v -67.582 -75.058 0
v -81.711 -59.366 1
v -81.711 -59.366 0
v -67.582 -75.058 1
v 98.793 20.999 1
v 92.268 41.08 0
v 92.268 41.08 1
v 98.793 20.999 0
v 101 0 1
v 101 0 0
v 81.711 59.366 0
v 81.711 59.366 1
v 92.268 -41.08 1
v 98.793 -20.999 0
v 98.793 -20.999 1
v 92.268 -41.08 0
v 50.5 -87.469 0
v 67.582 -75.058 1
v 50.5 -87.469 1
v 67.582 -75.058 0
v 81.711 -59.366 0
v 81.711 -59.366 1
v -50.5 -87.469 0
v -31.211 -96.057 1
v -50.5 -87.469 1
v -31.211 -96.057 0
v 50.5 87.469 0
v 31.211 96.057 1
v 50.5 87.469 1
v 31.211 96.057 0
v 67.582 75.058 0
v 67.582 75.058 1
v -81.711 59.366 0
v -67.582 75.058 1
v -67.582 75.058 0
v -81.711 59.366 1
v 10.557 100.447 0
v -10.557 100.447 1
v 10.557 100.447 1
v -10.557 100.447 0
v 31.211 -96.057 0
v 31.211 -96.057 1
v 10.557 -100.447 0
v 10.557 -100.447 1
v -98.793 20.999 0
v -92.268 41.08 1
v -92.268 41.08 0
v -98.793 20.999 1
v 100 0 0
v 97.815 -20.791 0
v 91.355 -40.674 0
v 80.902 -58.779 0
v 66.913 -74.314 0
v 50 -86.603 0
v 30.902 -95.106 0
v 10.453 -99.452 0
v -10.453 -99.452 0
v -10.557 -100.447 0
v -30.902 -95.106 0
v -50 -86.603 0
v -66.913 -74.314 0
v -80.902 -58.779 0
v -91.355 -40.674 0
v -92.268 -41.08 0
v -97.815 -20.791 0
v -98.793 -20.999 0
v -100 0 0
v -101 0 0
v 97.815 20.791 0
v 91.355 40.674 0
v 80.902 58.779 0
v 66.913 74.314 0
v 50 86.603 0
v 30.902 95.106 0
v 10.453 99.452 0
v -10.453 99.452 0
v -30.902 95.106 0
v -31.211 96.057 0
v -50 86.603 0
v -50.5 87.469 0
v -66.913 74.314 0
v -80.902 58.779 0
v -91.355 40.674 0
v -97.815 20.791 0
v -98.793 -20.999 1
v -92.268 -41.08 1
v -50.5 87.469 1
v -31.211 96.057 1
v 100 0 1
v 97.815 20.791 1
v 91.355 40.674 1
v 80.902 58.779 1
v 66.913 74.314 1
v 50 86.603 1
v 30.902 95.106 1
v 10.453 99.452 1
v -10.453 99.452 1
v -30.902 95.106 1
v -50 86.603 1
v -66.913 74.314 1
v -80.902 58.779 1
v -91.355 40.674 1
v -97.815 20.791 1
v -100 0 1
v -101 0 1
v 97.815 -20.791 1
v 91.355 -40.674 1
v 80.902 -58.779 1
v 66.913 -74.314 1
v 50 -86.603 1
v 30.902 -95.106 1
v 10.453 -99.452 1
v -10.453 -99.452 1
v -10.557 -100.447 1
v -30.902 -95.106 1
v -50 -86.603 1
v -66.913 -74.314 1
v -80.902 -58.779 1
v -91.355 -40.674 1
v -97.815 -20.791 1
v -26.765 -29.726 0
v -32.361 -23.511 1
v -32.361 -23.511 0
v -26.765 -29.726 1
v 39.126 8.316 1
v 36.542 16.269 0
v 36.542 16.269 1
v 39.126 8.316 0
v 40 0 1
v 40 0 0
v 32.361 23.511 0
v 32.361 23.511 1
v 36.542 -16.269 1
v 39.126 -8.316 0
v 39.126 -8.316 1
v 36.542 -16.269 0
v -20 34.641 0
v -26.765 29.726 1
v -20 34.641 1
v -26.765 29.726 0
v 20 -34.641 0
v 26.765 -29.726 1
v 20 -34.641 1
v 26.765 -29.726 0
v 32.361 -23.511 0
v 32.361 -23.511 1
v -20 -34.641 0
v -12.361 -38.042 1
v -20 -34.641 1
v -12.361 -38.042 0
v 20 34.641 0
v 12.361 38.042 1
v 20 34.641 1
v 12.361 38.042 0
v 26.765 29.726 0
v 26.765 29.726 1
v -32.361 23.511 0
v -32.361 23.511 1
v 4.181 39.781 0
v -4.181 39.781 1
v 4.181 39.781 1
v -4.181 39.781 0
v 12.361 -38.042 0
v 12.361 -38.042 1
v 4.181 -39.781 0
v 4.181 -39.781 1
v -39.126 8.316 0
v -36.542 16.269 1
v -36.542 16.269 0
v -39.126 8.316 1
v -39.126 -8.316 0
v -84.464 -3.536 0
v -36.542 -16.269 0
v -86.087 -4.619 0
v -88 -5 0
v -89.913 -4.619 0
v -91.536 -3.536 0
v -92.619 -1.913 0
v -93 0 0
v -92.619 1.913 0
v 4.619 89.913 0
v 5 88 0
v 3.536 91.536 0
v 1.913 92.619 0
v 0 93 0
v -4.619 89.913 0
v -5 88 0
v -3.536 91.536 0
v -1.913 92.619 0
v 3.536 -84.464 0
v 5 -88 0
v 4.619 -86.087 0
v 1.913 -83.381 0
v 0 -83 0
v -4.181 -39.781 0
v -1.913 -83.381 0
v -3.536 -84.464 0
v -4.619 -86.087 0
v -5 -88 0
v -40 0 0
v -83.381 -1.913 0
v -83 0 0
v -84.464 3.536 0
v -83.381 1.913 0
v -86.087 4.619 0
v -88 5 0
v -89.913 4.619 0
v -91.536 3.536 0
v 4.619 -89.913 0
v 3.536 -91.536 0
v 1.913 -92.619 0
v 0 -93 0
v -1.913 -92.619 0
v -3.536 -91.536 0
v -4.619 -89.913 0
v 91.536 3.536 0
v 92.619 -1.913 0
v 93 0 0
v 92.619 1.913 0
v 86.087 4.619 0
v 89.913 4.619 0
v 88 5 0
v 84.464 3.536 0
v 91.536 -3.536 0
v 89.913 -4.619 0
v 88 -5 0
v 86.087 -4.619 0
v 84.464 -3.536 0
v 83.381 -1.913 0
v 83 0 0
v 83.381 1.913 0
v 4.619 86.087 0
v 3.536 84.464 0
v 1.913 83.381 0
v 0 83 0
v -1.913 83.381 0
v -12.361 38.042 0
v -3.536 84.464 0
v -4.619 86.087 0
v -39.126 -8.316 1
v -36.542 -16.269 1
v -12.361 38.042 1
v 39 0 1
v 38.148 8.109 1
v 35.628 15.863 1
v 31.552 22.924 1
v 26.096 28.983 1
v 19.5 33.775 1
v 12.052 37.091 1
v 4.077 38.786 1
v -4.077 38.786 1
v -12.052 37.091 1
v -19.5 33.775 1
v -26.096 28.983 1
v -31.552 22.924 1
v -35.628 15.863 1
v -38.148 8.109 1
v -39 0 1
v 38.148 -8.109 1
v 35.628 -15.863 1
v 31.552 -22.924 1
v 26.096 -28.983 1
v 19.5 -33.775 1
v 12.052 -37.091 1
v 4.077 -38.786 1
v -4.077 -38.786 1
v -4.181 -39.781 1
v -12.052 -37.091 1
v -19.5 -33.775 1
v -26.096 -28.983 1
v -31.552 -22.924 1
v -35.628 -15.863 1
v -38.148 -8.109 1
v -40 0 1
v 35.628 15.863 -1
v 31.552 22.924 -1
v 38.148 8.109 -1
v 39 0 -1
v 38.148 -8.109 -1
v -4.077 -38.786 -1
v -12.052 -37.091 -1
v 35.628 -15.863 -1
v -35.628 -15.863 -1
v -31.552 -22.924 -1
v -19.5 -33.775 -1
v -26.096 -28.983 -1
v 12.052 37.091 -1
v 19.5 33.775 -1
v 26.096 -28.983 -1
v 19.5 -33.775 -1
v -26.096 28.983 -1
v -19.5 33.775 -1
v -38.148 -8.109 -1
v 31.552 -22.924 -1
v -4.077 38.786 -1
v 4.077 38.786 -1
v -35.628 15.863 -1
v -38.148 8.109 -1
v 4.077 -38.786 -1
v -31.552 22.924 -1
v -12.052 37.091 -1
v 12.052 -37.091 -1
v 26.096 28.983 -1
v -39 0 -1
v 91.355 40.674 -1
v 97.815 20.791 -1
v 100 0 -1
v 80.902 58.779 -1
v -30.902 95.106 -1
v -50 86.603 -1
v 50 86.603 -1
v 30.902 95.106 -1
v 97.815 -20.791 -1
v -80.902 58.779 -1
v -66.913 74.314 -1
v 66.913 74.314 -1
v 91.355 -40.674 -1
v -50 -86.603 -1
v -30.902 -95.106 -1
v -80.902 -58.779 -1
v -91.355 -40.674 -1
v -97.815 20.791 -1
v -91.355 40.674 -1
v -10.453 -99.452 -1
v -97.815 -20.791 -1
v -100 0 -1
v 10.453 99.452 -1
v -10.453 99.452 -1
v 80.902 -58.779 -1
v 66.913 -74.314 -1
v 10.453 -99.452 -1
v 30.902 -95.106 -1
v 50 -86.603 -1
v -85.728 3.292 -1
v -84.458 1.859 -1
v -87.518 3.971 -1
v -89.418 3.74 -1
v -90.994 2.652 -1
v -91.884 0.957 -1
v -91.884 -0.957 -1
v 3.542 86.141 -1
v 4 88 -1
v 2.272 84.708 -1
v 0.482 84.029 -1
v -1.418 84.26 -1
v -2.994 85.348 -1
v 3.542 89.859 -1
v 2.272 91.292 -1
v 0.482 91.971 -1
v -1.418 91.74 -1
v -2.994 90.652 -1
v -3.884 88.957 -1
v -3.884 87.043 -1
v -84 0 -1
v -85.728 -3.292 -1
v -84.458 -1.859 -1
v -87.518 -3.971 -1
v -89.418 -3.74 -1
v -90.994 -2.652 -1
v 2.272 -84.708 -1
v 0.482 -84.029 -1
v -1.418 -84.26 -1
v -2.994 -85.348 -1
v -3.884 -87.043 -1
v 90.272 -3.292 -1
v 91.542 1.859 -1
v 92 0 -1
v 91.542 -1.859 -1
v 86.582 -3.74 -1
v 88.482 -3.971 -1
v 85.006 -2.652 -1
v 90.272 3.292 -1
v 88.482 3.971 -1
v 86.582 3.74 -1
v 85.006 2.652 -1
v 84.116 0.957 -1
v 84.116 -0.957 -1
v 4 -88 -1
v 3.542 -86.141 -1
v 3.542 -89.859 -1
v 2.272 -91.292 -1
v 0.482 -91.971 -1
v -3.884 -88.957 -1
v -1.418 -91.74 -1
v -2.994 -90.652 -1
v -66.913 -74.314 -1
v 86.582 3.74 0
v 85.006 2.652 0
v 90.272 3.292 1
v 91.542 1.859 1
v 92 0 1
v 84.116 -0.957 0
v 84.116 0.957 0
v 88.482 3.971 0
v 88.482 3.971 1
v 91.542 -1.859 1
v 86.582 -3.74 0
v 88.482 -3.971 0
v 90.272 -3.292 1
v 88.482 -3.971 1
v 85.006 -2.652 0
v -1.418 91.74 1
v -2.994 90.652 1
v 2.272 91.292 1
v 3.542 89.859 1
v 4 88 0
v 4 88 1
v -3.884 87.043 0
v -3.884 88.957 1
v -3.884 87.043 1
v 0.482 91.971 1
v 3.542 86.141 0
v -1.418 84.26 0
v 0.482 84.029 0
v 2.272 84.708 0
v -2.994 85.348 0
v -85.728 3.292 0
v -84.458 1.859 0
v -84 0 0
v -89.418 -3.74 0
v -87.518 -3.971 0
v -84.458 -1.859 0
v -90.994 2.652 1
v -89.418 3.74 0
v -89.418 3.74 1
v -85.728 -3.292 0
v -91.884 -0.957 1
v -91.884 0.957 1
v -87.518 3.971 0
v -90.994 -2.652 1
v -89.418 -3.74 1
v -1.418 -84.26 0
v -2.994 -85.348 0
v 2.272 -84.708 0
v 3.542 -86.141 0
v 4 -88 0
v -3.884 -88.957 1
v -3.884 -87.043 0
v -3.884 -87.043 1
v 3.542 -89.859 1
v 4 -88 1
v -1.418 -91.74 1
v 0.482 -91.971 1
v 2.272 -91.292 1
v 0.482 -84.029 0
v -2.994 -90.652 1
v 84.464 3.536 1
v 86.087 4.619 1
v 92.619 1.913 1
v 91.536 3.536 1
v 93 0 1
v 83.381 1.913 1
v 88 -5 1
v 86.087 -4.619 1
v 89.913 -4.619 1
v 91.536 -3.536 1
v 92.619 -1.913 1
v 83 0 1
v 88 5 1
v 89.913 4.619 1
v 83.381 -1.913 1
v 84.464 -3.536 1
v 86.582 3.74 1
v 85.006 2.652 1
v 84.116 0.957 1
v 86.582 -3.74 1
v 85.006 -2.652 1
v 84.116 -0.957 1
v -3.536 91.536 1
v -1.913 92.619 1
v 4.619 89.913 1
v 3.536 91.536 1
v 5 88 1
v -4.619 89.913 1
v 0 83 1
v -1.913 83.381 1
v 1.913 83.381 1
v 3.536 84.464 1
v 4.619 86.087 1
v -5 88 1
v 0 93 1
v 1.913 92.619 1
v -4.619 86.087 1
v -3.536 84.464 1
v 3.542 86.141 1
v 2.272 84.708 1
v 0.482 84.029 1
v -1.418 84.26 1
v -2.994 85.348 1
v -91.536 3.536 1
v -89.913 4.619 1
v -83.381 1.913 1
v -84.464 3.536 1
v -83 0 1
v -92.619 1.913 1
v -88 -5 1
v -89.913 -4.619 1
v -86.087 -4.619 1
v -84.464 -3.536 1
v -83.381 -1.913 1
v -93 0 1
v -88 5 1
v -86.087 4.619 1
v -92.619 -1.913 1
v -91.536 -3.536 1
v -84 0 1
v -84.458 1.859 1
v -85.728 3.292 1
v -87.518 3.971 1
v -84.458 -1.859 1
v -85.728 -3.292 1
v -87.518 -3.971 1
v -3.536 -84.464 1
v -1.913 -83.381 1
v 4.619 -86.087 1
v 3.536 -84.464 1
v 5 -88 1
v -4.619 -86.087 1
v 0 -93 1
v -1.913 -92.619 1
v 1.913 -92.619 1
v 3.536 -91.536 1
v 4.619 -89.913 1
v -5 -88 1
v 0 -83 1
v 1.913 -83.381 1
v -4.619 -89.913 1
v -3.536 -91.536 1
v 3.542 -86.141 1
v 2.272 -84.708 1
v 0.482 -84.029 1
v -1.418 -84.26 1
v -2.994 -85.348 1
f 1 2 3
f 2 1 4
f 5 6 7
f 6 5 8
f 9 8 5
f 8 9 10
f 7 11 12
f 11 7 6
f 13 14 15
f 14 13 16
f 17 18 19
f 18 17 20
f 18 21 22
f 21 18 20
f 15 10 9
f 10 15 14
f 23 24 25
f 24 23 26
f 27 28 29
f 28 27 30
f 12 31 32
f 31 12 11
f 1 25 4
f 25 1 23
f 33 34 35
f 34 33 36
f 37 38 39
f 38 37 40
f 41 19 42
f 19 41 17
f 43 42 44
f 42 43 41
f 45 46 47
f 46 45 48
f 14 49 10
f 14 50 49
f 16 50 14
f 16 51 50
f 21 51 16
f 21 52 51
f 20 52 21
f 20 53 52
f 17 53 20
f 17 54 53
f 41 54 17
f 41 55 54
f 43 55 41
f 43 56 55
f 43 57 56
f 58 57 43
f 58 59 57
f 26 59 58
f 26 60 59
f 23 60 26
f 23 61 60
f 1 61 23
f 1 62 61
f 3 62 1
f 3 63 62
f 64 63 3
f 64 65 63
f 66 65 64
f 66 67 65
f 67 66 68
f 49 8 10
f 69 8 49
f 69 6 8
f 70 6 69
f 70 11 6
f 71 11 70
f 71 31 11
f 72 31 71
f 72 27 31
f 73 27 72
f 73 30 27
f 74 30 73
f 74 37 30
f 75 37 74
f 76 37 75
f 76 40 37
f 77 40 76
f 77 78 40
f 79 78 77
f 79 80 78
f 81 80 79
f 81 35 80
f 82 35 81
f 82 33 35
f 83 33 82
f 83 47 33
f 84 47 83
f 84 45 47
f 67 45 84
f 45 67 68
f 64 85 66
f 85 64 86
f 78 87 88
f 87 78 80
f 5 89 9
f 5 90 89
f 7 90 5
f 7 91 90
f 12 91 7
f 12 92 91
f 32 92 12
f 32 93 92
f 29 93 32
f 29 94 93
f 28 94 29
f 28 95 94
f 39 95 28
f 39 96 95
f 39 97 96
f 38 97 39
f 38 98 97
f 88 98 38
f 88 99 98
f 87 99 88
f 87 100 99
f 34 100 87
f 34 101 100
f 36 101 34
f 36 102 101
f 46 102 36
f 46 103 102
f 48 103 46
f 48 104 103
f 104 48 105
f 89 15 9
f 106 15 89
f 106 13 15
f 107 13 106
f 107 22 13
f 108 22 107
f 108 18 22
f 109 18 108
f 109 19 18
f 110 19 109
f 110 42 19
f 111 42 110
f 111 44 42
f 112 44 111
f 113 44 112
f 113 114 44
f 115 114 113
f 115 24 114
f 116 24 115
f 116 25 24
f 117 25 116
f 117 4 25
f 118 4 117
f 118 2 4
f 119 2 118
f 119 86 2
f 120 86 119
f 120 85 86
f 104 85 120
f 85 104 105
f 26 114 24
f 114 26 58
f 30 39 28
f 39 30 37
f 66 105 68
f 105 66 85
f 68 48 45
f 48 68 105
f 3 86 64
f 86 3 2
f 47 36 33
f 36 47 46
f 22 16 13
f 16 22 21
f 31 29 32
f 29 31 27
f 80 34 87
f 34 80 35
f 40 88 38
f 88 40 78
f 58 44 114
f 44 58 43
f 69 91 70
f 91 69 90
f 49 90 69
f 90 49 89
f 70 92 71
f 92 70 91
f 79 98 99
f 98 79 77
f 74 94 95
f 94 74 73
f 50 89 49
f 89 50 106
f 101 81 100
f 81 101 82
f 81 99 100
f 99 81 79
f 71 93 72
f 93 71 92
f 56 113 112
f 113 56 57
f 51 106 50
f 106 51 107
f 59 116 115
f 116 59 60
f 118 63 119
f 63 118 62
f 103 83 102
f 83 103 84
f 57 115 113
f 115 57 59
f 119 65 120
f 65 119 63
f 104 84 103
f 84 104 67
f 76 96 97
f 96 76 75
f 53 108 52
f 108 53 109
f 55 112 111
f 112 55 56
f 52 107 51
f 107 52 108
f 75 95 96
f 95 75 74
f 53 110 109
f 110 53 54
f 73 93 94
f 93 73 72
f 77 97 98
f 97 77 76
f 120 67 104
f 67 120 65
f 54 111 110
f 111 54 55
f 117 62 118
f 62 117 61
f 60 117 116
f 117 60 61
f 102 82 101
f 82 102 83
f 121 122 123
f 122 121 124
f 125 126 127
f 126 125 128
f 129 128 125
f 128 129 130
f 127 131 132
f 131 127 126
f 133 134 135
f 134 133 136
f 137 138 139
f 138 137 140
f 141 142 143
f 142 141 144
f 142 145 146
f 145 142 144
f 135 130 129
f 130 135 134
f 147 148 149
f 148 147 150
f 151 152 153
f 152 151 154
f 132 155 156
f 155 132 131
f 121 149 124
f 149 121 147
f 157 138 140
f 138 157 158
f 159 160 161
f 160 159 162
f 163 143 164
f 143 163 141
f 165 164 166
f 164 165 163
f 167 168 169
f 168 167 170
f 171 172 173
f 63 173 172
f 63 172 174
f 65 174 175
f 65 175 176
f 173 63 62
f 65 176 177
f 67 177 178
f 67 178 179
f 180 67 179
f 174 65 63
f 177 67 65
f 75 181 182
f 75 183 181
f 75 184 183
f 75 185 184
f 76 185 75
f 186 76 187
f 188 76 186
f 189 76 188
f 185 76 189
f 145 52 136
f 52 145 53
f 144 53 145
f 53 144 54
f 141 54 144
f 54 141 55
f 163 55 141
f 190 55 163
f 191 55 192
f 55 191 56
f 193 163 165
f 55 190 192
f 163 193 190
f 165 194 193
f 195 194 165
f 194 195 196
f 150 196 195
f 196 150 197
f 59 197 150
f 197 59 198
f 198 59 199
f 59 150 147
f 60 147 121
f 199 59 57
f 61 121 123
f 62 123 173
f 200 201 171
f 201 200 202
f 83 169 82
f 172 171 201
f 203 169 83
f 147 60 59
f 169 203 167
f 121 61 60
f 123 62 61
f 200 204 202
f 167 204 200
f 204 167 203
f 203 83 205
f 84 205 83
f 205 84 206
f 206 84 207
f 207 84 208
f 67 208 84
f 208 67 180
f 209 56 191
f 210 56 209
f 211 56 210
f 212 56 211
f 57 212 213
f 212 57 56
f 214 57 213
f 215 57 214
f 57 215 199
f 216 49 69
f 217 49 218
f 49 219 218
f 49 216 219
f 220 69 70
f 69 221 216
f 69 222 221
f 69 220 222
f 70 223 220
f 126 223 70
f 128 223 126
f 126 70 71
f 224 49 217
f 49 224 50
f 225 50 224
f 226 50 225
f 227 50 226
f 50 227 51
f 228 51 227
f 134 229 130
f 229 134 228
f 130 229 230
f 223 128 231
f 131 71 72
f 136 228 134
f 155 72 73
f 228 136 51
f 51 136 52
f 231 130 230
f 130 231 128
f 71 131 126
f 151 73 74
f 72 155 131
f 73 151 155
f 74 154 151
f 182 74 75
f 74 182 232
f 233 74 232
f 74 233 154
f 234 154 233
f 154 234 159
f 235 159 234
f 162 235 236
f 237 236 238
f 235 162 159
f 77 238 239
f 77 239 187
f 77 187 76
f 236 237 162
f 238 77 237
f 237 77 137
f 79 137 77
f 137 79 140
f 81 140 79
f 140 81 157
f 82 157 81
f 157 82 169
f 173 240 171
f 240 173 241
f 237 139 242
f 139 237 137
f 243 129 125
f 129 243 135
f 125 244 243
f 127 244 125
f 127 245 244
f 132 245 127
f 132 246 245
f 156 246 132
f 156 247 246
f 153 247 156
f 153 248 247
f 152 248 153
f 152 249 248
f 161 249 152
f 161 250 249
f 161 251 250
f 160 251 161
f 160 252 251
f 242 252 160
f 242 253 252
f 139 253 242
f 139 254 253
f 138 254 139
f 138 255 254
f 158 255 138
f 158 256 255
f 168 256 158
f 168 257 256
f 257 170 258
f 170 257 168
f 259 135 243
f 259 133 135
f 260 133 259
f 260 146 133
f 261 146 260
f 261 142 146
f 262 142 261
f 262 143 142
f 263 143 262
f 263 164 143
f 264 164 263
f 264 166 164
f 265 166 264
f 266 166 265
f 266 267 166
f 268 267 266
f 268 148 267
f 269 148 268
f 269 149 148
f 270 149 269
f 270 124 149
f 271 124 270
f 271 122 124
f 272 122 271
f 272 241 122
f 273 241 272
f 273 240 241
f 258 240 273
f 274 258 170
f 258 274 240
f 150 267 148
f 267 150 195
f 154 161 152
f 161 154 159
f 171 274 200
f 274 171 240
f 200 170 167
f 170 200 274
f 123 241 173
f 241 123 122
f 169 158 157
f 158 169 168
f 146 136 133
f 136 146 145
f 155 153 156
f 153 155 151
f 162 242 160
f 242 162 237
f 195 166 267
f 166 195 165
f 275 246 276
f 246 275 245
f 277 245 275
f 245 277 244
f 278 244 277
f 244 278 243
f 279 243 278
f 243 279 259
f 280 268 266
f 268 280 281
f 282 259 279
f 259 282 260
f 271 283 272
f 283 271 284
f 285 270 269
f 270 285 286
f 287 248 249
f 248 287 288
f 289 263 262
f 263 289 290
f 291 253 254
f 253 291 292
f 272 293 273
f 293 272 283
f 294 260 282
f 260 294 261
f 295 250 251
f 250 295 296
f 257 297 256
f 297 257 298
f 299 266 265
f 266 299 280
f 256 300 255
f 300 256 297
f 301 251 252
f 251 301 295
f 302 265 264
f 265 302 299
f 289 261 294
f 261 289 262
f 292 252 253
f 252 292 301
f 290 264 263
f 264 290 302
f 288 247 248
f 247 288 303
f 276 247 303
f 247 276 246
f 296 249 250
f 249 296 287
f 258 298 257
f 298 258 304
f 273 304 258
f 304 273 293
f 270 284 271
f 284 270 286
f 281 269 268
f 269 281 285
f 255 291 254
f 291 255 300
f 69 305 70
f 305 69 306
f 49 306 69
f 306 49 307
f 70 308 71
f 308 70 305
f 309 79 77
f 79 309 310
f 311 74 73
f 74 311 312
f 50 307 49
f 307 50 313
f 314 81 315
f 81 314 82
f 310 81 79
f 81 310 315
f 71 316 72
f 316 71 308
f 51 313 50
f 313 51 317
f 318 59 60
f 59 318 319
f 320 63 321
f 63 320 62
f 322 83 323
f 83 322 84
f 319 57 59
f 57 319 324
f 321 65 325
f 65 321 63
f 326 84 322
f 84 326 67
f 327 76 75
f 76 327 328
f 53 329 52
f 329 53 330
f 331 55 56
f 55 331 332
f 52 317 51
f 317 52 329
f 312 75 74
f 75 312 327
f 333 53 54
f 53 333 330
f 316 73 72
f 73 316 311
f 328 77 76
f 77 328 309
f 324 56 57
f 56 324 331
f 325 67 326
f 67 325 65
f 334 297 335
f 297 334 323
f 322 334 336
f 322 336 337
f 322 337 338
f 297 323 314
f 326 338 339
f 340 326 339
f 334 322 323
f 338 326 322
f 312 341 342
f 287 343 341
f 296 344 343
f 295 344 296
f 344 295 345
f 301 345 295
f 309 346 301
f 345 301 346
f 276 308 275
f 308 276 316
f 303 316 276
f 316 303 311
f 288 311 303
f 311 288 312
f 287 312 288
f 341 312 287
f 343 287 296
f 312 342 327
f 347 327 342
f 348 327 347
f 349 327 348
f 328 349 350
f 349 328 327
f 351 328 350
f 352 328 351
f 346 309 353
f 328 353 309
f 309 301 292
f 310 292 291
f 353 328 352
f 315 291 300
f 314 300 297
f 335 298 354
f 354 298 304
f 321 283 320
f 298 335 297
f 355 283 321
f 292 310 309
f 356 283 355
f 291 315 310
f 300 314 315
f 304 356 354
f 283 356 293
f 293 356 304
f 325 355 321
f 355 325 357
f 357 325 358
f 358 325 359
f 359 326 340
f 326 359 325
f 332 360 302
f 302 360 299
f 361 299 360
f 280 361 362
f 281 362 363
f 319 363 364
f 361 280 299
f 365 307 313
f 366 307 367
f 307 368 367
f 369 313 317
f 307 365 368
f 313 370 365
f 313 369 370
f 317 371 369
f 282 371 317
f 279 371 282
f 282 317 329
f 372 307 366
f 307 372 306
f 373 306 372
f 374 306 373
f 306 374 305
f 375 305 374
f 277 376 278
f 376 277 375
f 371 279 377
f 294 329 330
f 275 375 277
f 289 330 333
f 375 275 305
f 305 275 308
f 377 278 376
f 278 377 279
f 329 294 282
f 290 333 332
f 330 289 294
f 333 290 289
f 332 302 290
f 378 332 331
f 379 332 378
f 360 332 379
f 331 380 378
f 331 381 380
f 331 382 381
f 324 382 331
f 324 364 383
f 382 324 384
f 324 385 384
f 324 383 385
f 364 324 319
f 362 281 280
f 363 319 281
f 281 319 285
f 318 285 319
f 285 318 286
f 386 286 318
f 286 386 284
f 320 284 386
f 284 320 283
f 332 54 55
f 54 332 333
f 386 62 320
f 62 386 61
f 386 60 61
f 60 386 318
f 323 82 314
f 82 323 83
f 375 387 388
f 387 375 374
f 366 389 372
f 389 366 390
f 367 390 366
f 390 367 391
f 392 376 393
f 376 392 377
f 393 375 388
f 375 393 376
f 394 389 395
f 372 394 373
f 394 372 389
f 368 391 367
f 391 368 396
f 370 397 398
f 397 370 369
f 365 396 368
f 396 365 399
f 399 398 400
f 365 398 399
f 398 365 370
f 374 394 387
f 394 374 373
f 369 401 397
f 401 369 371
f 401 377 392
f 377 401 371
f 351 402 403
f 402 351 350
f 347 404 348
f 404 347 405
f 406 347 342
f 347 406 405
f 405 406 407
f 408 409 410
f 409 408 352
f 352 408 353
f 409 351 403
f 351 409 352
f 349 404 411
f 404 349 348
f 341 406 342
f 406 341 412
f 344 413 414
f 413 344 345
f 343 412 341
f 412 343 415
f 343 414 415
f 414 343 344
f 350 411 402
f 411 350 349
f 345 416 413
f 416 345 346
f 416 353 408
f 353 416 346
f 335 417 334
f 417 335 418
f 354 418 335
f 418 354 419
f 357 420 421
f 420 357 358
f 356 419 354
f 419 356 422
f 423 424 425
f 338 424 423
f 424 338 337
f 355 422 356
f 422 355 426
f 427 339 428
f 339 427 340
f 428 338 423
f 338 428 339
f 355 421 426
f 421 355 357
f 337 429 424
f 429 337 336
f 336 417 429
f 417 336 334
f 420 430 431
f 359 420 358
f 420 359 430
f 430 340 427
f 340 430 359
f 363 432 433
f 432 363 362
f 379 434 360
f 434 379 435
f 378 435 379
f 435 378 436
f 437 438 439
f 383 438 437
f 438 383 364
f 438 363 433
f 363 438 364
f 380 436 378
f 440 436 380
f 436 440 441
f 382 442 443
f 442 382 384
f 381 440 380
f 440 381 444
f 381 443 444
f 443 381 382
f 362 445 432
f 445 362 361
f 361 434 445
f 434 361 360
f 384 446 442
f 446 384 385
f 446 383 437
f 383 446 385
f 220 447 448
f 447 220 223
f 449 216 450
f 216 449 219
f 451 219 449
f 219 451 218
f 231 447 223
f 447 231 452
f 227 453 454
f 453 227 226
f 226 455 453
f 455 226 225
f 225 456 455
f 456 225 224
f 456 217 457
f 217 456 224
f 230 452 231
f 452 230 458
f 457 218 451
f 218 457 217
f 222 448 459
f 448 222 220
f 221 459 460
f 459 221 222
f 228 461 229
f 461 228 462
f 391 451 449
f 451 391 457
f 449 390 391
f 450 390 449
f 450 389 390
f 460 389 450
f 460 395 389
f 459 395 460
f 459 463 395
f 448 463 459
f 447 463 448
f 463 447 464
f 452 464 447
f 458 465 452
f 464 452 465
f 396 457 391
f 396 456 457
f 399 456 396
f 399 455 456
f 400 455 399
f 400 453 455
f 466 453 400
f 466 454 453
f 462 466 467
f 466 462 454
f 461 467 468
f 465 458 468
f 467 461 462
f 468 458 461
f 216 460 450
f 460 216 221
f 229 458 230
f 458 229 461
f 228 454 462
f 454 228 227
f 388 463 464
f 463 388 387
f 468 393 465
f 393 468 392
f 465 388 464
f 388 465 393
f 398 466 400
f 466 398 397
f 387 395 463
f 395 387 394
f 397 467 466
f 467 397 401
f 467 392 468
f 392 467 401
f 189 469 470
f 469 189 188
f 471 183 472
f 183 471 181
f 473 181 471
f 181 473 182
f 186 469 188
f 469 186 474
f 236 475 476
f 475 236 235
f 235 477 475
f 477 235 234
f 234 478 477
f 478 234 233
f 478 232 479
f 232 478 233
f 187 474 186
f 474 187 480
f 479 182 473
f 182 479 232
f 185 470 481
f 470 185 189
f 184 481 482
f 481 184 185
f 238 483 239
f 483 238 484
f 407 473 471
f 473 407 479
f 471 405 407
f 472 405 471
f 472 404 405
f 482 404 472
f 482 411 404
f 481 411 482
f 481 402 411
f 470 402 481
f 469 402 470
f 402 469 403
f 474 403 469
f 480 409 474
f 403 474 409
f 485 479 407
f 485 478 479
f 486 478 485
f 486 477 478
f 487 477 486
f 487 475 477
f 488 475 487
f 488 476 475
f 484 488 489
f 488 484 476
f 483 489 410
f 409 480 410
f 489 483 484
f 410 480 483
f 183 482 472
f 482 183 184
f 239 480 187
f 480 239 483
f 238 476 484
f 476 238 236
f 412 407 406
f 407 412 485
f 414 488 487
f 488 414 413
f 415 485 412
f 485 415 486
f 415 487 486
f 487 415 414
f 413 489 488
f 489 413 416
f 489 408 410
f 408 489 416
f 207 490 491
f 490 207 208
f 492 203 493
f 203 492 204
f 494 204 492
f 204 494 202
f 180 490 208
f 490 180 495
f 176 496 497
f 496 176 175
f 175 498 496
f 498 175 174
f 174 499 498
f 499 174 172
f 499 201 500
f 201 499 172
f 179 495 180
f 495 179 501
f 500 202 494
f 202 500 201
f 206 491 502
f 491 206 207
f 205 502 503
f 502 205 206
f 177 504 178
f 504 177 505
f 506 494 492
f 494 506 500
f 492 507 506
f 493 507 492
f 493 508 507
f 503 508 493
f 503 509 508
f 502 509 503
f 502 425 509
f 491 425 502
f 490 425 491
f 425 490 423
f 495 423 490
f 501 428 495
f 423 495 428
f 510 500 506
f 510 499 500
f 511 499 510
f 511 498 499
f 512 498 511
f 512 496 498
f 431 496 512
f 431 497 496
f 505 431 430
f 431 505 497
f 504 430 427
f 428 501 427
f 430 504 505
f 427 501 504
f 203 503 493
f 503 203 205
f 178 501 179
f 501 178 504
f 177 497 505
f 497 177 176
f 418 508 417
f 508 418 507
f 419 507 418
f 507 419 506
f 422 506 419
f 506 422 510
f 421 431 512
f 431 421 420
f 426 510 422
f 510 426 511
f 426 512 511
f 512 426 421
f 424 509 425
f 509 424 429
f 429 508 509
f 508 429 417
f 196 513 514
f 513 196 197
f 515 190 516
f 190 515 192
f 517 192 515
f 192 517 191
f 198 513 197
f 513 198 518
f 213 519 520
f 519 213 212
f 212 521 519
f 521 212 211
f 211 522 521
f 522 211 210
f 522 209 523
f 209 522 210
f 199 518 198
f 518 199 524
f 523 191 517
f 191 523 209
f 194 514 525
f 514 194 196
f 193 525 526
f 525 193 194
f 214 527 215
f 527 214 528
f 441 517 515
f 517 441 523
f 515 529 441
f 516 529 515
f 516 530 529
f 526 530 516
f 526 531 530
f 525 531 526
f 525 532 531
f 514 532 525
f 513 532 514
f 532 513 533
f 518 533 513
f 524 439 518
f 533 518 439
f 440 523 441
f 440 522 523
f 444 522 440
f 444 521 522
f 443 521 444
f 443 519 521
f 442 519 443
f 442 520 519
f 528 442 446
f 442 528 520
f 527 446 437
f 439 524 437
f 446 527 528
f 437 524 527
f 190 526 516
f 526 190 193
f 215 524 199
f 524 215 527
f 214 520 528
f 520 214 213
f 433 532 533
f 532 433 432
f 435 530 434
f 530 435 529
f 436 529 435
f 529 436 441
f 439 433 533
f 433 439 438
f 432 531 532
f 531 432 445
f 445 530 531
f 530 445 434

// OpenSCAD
radius = 100;
outerBorderThickness = 1;

innerRadius = 39;
innerBorderThickness = 1;

bottomThickness = 1;
height = 2 - bottomThickness;

holeDistanceFromSide = 10;
holeInnerRadius = 4;
holeBorderThickness = 1;




pillar(radius, outerBorderThickness, height);
pillar(innerRadius, innerBorderThickness, height);

difference() {
    translate([0, 0, -bottomThickness]) {
        pillar(innerRadius, radius - innerRadius, bottomThickness);
    }

    translate([radius - holeDistanceFromSide - holeInnerRadius / 2, 0,-bottomThickness]) {
        cylinder(bottomThickness, holeInnerRadius, holeInnerRadius);
    }
    translate([0, radius - holeDistanceFromSide - holeInnerRadius / 2, -bottomThickness]) {
        cylinder(bottomThickness, holeInnerRadius, holeInnerRadius);
    }

    translate([-(radius - holeDistanceFromSide - holeInnerRadius / 2), 0, -bottomThickness]) {
        cylinder(bottomThickness, holeInnerRadius, holeInnerRadius);
    }

    translate([0, -(radius - holeDistanceFromSide - holeInnerRadius / 2), -bottomThickness]) {
        cylinder(bottomThickness, holeInnerRadius, holeInnerRadius);
    }

}


translate([radius - holeDistanceFromSide - holeInnerRadius / 2, 0, 0]) {
    pillar(holeInnerRadius, holeBorderThickness, height);
}

translate([0, radius - holeDistanceFromSide - holeInnerRadius / 2, 0]) {
    pillar(holeInnerRadius, holeBorderThickness, height);
}

translate([-(radius - holeDistanceFromSide - holeInnerRadius / 2), 0, 0]) {
    pillar(holeInnerRadius, holeBorderThickness, height);
}

translate([0, -(radius - holeDistanceFromSide - holeInnerRadius / 2), 0]) {
    pillar(holeInnerRadius, holeBorderThickness, height);
}






module pillar(innerRadius, thickness, height) {
    difference() {
        cylinder(height, innerRadius + thickness, innerRadius + thickness);
        cylinder(height, innerRadius, innerRadius);
    }
}
/*


  
module segment(innerWidth = 50) {
    
    cube([holeDepth + deviderDepth, (outerWidth - innerWidth) / 2, height]);

    translate([0, 0, 0])
      cube([deviderDepth, outerWidth, height]);
  

    translate([0, outerWidth - (outerWidth - innerWidth) / 2, 0])
       cube([holeDepth + deviderDepth, (outerWidth - innerWidth) / 2, height]);

}


segments = 72;
sidePatternDomain = 15;

smallSegmentWidth = 10;
mediumSegmentWidth = 40;
largeSegmentWidth = 90;
// middel = 13
// klein = 9

for (i = [0:1:segments]) 
{   
    translate([i * (deviderDepth + holeDepth), 0, 0]) {
        
        if (i > sidePatternDomain && i < segments - sidePatternDomain)
        {
            if (i % 2 == 0) 
            {
                if (i % 3 == 0)
                {
                    segment(mediumSegmentWidth);
                } else {
                    segment(largeSegmentWidth);
                }
            } else {
                if (i % 3 == 0)
                {
                    segment(mediumSegmentWidth);
                } else { 
                    segment(smallSegmentWidth);
                }
            }
        } else {
            if (i % 2 == 1) //(i < segments / 2 ? 1 : 0)) 
            {
                segment(smallSegmentWidth);
            } else {
                segment(largeSegmentWidth);
            }
        }
        
    }
}

translate([(segments + 1) * (deviderDepth + holeDepth), 0, 0])
    cube([borderDepth, outerWidth, height]);

translate([-borderDepth + deviderDepth, 0, 0])
    cube([borderDepth - deviderDepth, outerWidth, height]);
    
    
    */
